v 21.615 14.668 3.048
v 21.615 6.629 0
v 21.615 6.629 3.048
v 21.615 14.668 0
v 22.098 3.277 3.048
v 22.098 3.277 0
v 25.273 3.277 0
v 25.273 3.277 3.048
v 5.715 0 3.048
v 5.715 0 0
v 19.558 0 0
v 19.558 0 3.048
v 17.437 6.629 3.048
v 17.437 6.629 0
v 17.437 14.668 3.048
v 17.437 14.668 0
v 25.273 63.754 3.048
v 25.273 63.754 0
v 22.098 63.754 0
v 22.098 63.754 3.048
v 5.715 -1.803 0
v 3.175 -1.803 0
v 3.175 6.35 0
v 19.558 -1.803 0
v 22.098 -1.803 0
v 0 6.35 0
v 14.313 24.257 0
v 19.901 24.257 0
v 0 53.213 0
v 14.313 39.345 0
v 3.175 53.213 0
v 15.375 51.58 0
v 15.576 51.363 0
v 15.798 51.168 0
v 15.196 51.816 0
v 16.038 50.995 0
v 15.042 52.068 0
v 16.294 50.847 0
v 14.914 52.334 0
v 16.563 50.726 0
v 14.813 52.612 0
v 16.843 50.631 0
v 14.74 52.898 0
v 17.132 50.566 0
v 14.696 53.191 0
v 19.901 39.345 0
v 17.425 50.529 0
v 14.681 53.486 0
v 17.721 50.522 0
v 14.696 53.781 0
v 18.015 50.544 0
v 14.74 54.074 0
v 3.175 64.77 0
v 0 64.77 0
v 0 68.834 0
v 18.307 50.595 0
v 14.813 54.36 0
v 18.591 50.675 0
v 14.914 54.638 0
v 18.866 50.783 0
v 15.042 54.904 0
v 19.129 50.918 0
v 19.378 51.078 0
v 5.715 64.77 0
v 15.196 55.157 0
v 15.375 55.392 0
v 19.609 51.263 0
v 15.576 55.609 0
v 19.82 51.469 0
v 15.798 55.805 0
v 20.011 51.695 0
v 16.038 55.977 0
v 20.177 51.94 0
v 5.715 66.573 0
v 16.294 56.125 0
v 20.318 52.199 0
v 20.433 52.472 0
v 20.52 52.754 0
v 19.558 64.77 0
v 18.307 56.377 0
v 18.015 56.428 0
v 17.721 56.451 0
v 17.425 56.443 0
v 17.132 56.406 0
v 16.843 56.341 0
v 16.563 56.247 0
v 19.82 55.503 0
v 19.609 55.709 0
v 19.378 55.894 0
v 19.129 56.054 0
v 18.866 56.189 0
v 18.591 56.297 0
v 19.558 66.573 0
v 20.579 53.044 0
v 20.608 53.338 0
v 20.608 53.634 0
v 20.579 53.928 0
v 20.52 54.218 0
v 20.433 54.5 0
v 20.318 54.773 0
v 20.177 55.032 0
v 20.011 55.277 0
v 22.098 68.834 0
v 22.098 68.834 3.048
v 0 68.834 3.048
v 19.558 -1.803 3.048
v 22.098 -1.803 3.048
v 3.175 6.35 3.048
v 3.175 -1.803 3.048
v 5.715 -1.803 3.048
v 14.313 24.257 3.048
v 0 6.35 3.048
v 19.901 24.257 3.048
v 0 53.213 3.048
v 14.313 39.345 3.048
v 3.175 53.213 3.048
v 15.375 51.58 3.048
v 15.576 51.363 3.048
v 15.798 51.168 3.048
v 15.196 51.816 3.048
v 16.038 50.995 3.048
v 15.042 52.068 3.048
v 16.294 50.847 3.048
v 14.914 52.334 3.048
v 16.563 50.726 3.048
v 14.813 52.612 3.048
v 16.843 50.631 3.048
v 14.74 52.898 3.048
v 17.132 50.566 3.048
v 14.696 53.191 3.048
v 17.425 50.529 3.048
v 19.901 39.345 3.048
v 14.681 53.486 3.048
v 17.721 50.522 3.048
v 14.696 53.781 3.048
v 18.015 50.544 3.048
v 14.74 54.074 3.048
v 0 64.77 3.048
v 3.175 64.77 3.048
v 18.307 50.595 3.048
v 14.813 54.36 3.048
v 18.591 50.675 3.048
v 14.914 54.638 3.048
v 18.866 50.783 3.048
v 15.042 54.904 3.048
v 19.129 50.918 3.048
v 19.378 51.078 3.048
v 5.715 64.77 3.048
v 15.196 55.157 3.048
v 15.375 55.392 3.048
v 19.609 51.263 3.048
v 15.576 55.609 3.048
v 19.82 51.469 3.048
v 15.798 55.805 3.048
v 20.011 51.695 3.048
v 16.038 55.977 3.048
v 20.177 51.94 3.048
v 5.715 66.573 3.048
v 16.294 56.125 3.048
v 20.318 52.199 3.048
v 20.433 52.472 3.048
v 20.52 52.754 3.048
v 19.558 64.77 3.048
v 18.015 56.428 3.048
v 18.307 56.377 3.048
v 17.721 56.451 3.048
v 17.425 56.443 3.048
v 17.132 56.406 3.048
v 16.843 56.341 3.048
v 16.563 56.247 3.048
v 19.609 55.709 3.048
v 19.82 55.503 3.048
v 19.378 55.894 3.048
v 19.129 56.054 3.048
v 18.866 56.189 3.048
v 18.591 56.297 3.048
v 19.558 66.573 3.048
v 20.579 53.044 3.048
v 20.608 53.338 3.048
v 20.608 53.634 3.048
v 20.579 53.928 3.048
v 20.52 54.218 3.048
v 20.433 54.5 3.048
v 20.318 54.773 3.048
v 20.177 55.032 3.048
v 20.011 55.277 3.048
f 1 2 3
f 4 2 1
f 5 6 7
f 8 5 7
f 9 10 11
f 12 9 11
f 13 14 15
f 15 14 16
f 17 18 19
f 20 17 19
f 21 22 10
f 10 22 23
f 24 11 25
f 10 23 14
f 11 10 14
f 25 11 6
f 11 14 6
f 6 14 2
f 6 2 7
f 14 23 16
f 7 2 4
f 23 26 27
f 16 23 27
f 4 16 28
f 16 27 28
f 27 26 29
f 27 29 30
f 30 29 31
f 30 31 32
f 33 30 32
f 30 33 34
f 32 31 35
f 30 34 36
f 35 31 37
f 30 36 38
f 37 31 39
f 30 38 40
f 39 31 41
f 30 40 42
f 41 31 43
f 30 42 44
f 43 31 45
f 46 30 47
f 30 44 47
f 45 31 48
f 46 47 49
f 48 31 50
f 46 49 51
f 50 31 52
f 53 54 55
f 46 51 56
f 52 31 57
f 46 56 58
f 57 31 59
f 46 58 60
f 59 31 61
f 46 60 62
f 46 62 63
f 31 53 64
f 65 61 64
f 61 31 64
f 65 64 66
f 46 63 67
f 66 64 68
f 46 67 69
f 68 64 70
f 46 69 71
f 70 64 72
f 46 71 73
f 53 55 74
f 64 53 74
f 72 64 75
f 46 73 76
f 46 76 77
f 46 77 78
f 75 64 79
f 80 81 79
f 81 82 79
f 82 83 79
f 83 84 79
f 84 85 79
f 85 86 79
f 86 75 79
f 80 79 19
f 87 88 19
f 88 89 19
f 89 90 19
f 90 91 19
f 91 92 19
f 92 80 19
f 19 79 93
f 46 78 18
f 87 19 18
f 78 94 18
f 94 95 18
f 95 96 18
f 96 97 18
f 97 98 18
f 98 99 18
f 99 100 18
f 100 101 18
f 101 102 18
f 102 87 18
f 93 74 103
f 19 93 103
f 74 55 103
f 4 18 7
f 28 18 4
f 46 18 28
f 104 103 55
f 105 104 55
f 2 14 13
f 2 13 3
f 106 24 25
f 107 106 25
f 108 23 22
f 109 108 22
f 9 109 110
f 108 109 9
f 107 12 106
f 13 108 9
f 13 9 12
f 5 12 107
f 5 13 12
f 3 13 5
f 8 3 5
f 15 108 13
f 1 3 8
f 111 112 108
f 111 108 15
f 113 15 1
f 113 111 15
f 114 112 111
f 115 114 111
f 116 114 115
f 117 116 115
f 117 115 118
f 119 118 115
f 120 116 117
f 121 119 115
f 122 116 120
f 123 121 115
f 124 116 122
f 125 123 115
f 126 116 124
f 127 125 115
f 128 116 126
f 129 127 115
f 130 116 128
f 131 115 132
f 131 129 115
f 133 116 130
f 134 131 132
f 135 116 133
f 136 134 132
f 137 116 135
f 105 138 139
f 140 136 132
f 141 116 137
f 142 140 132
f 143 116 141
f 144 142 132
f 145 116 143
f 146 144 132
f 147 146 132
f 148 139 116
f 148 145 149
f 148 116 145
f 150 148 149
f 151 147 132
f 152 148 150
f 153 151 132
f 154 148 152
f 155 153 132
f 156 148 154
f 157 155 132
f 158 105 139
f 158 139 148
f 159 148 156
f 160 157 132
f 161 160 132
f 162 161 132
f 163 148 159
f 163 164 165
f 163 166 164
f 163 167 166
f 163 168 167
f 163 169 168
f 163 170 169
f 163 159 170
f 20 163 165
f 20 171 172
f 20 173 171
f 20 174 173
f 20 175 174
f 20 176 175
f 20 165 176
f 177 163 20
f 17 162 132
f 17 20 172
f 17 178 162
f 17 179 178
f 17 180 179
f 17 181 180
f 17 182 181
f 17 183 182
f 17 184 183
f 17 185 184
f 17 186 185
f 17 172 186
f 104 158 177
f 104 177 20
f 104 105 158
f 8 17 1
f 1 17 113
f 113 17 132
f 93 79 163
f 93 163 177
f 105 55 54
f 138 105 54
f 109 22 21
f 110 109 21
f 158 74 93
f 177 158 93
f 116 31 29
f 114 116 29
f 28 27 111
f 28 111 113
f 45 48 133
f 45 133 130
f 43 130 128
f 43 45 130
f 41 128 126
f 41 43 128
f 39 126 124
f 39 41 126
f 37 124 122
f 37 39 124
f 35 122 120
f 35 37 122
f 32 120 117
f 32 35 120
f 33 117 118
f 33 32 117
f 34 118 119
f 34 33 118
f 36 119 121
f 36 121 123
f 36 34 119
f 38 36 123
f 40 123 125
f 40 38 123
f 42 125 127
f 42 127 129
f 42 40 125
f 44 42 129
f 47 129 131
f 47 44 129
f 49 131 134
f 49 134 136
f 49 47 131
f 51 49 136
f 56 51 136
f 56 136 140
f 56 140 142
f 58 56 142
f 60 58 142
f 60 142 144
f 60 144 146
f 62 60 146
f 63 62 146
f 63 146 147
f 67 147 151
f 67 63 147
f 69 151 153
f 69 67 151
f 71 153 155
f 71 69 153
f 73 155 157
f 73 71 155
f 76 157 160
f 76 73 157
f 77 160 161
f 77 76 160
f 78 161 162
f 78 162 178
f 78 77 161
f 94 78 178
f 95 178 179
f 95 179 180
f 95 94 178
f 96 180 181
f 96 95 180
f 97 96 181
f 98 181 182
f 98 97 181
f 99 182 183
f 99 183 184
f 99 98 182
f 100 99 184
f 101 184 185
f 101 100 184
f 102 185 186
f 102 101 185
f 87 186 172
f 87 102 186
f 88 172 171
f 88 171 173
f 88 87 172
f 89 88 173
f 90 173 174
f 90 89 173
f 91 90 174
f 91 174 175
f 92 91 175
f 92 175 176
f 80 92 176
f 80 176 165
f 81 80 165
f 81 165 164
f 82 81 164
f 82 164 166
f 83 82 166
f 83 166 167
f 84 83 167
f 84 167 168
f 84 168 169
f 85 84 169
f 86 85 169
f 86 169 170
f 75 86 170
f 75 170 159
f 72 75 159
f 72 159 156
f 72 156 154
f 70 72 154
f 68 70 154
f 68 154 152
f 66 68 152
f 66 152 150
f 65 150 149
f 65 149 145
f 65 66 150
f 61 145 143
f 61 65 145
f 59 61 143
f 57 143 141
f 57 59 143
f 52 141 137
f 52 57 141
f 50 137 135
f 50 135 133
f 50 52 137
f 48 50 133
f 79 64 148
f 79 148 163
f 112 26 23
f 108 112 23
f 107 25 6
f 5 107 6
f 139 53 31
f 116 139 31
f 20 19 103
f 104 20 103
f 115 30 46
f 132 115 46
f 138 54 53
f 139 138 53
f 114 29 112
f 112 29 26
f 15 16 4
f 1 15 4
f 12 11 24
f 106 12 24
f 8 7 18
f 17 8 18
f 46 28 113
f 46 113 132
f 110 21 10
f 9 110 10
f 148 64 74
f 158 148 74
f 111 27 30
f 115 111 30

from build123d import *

# Parameters (mm, degrees)
SKETCH1_W           = 4.1783
SKETCH1_H           = 8.0391
SKETCH1_W_2         = 5.588
SKETCH1_H_2         = 15.0876
SKETCH1_W_3         = 13.843
SKETCH1_H_3         = 1.8034
SKETCH1_R           = 2.96545
BOSS_EXTRUDE1_DEPTH = 3.048


with BuildPart() as part:
    # Sketch1 → Boss-Extrude1 (new body)
    with BuildSketch(Plane.XY):
        Polygon((3.175, 64.77), (3.175, 53.213), (0, 53.213), (0, 6.35), (3.175, 6.35), (3.175, -1.8034), (5.715, -1.8034), (5.715, 0), (19.558, 0), (19.558, -1.8034), (22.098, -1.8034), (22.098, 3.2766), (25.273, 3.2766), (25.273, 63.754), (22.098, 63.754), (22.098, 68.834), (0, 68.834), (0, 64.77), align=None)
        with Locations((19.52625, 10.64895)):
            Rectangle(SKETCH1_W, SKETCH1_H, mode=Mode.SUBTRACT)
        with Locations((17.1069, 31.8008)):
            Rectangle(SKETCH1_W_2, SKETCH1_H_2, mode=Mode.SUBTRACT)
        with Locations((12.6365, 65.6717)):
            Rectangle(SKETCH1_W_3, SKETCH1_H_3, mode=Mode.SUBTRACT)
        with Locations(Location((17.64665, 53.48605, 0), (0, 0, 180))):
            Circle(SKETCH1_R, mode=Mode.SUBTRACT)
    extrude(amount=BOSS_EXTRUDE1_DEPTH)


solid = part.part
